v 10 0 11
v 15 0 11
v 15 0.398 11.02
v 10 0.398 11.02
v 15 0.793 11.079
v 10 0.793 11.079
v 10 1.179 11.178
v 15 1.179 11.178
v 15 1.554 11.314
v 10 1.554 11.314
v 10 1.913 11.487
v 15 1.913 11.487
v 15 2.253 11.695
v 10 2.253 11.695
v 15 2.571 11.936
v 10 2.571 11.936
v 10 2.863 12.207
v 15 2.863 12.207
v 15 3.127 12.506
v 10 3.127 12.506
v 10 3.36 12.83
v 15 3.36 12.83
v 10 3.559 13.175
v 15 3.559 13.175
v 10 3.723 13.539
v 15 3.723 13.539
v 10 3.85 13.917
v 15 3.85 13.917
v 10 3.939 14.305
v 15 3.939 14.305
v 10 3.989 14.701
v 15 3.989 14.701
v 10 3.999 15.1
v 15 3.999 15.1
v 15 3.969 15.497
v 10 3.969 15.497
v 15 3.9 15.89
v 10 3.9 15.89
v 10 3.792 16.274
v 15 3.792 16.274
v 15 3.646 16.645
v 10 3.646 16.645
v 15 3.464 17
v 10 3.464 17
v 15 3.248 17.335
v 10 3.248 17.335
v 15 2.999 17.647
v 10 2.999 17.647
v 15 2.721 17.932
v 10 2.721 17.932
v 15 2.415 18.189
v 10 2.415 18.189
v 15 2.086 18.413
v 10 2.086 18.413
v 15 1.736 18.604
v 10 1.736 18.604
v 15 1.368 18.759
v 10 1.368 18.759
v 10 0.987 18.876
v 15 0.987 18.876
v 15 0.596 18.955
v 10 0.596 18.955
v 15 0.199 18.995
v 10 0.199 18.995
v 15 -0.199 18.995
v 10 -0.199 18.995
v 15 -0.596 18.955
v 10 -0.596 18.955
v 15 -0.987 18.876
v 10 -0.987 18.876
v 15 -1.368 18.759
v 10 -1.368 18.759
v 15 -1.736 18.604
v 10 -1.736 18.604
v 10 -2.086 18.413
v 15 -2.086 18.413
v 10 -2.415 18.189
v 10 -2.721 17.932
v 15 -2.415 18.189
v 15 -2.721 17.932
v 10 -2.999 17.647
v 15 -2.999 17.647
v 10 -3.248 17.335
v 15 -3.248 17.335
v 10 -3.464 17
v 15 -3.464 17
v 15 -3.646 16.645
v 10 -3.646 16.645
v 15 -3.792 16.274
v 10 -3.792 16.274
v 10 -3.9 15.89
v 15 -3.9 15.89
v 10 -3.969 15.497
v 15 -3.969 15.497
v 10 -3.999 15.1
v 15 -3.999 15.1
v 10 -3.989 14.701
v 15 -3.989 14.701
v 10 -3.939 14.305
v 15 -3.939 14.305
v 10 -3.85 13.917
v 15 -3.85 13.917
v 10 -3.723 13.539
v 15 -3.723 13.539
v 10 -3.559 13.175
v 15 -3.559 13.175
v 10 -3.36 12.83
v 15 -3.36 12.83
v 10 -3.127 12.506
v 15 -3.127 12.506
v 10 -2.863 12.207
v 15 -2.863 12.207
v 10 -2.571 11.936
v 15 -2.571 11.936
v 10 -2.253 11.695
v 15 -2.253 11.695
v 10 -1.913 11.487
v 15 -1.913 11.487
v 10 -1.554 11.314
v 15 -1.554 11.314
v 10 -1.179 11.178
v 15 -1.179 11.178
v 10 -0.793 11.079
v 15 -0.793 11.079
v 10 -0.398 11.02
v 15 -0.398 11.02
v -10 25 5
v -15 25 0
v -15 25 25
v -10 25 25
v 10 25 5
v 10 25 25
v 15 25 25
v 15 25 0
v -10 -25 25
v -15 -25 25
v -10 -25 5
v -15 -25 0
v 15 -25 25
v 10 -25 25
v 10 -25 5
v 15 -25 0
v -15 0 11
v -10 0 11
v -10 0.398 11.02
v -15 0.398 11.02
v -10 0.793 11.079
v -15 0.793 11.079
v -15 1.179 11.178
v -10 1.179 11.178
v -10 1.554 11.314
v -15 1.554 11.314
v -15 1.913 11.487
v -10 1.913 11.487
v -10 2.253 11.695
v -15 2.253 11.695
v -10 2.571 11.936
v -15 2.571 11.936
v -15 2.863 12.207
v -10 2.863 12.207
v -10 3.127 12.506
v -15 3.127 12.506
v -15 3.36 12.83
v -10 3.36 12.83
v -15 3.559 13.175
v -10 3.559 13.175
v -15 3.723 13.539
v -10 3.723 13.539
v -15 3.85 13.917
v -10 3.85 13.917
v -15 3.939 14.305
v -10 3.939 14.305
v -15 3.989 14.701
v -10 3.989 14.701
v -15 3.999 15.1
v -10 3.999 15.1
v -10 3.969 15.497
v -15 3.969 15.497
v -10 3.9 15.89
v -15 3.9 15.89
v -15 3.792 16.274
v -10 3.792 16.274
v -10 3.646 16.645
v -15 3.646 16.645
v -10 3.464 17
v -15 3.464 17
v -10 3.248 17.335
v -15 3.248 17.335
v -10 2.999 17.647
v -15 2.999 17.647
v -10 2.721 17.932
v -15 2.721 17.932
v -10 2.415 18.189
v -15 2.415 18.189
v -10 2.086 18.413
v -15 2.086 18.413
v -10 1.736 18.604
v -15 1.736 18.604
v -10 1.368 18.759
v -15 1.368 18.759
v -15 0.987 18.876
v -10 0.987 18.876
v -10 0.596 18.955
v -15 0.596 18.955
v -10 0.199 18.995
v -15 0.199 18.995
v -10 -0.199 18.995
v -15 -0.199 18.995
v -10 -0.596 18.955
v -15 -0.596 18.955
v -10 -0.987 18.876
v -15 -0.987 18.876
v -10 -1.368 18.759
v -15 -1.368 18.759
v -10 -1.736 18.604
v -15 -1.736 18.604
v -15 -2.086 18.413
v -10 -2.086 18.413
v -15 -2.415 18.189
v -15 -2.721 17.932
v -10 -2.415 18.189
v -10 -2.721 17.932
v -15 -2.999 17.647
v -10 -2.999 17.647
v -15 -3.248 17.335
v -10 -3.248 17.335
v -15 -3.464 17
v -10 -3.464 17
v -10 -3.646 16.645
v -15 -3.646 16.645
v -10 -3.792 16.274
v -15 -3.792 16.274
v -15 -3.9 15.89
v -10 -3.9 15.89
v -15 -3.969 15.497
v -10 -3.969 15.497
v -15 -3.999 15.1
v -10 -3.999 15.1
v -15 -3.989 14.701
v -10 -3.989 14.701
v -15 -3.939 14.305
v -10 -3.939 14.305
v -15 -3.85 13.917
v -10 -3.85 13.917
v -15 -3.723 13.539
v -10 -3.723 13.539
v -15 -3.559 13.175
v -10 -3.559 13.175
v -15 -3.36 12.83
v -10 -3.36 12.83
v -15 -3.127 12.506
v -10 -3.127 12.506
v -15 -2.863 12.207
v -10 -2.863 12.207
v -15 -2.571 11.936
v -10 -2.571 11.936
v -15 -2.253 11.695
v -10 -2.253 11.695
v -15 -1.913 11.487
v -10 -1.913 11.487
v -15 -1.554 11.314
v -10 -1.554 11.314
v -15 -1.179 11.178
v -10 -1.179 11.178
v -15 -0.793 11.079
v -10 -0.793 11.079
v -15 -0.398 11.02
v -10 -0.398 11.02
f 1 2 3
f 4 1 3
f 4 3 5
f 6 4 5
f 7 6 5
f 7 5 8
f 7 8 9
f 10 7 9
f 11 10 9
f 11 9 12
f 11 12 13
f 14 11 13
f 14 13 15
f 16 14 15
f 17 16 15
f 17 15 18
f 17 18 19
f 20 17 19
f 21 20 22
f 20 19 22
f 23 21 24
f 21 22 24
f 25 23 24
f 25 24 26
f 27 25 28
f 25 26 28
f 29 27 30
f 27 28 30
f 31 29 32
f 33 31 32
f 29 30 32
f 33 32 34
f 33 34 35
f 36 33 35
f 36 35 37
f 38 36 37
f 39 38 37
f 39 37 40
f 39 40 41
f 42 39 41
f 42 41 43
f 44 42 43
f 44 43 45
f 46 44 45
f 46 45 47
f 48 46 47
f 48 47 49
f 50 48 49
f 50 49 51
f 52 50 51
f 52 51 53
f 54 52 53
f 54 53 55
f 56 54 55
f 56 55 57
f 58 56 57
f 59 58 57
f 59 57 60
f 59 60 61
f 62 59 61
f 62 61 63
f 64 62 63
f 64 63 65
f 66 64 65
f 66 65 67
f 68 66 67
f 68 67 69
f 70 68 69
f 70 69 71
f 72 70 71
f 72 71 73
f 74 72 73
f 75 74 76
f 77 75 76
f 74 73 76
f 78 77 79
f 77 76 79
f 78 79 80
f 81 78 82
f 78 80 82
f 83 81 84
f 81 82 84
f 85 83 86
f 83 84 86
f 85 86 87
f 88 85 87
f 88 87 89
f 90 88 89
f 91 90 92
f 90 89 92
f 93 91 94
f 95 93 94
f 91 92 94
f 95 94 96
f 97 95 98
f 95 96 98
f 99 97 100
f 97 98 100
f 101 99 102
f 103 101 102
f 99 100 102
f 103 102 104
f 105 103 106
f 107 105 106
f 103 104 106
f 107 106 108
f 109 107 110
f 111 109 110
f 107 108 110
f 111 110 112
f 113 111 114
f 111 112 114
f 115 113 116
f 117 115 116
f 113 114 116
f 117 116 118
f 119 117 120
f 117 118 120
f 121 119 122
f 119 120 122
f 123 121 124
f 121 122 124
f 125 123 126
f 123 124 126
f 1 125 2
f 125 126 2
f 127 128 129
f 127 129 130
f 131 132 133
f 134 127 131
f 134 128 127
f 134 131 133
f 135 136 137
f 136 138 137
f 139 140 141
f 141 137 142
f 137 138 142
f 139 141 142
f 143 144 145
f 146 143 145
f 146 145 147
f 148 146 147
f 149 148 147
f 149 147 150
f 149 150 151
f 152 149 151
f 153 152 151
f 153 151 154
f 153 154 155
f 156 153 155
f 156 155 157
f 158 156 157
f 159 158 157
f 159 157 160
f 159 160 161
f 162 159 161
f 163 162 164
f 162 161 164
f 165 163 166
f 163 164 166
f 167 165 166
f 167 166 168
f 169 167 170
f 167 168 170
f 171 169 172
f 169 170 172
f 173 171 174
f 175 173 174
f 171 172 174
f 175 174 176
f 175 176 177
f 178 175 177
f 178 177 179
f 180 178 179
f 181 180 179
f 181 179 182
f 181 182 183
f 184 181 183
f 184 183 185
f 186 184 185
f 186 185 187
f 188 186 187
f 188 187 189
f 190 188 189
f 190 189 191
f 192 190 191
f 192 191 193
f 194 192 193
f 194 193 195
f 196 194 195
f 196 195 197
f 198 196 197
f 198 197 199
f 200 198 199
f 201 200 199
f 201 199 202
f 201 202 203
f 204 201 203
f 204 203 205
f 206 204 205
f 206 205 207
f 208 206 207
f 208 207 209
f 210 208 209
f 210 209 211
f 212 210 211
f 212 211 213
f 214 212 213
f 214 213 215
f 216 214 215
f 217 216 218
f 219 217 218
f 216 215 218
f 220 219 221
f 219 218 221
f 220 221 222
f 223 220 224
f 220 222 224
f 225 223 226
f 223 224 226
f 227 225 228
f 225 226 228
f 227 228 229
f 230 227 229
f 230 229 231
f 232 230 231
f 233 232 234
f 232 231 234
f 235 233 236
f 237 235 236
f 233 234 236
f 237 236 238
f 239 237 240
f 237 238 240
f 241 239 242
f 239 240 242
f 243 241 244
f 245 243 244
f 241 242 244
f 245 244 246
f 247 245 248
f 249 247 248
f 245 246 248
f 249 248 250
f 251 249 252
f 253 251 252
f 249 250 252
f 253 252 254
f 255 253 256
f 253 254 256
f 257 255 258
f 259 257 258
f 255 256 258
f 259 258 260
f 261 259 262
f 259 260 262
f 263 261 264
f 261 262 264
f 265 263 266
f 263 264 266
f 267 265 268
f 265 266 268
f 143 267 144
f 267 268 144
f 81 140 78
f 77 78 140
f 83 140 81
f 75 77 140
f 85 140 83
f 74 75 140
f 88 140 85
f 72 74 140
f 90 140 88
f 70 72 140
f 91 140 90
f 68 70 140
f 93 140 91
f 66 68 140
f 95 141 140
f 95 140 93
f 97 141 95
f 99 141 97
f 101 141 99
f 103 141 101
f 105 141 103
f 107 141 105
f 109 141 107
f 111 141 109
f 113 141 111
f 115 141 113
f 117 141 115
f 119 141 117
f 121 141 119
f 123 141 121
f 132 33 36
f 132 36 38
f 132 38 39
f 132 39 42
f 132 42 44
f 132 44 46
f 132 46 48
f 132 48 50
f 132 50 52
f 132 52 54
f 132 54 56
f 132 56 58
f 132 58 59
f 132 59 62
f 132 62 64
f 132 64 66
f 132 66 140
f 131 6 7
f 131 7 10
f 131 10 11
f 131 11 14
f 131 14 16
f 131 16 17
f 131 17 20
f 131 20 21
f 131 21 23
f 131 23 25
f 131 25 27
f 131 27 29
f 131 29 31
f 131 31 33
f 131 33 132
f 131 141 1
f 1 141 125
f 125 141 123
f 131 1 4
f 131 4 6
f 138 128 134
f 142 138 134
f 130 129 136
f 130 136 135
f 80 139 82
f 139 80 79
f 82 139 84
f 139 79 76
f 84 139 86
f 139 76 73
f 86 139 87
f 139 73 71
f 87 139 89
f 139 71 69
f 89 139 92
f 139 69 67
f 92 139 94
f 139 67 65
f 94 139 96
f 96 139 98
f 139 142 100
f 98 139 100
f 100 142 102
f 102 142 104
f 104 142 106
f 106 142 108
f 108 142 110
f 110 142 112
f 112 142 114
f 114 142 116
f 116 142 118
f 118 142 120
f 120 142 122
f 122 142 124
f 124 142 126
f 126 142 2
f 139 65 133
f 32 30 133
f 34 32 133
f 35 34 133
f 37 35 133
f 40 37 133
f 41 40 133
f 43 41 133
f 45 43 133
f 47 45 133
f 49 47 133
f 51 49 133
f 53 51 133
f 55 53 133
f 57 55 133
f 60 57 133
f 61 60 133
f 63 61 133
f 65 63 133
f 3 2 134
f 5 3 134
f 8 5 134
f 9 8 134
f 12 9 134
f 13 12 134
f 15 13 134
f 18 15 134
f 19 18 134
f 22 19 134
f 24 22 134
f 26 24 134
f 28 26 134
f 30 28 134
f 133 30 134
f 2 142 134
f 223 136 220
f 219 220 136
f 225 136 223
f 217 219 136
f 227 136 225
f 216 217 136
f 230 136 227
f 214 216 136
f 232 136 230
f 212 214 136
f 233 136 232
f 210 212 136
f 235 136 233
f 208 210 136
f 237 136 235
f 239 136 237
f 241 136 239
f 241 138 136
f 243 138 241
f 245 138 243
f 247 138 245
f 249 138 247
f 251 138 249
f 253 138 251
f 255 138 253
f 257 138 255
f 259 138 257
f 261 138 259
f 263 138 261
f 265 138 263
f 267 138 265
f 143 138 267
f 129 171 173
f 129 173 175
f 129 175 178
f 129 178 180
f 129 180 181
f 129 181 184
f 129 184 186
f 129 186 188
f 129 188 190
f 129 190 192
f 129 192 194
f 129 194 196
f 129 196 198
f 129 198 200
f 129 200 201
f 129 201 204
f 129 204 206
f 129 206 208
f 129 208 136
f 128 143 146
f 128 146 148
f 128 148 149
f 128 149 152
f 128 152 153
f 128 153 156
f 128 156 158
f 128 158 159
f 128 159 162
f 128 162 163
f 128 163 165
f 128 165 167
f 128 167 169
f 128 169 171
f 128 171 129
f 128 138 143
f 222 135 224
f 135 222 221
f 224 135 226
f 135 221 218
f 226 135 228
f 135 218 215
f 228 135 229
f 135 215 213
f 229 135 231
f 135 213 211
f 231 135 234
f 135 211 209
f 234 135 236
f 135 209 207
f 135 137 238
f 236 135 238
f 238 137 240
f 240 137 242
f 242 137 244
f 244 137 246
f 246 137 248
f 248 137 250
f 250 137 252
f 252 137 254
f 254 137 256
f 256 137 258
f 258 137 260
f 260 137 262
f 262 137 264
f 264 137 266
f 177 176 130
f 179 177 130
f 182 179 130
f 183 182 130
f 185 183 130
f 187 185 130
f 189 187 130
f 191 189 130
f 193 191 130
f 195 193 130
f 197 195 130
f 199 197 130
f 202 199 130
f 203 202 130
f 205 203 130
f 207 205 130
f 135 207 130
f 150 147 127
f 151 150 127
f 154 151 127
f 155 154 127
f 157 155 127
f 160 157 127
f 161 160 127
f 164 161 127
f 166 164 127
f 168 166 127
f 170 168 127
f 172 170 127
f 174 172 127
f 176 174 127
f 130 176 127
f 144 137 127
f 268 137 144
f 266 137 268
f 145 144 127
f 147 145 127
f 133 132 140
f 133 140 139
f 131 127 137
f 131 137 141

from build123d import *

# Parameters (mm, degrees)
SKETCH1_W           = 30
SKETCH1_H           = 50
BOSS_EXTRUDE1_DEPTH = 5
SKETCH2_W           = 5
SKETCH2_H           = 50
BOSS_EXTRUDE2_DEPTH = 20
SKETCH3_R           = 4
CUT_EXTRUDE1_DEPTH  = 47.368092477


with BuildPart() as part:
    # Sketch1 → Boss-Extrude1 (new body)
    with BuildSketch(Plane.XY):
        Rectangle(SKETCH1_W, SKETCH1_H)
    extrude(amount=BOSS_EXTRUDE1_DEPTH)

    # Sketch2 → Boss-Extrude2 (add)
    with BuildSketch(Plane.XY.offset(5)):
        with Locations((-12.5, 0)):
            Rectangle(SKETCH2_W, SKETCH2_H)
        with Locations((12.5, 0)):
            Rectangle(SKETCH2_W, SKETCH2_H)
    extrude(amount=BOSS_EXTRUDE2_DEPTH)

    # Sketch3 → Cut-Extrude1 (cut, through all)
    with BuildSketch(Plane(origin=(15, 0, 0), x_dir=(0, 0, -1), z_dir=(1, 0, 0))):
        with Locations((-15, 0)):
            Circle(SKETCH3_R)
    extrude(amount=-CUT_EXTRUDE1_DEPTH, mode=Mode.SUBTRACT)


solid = part.part
